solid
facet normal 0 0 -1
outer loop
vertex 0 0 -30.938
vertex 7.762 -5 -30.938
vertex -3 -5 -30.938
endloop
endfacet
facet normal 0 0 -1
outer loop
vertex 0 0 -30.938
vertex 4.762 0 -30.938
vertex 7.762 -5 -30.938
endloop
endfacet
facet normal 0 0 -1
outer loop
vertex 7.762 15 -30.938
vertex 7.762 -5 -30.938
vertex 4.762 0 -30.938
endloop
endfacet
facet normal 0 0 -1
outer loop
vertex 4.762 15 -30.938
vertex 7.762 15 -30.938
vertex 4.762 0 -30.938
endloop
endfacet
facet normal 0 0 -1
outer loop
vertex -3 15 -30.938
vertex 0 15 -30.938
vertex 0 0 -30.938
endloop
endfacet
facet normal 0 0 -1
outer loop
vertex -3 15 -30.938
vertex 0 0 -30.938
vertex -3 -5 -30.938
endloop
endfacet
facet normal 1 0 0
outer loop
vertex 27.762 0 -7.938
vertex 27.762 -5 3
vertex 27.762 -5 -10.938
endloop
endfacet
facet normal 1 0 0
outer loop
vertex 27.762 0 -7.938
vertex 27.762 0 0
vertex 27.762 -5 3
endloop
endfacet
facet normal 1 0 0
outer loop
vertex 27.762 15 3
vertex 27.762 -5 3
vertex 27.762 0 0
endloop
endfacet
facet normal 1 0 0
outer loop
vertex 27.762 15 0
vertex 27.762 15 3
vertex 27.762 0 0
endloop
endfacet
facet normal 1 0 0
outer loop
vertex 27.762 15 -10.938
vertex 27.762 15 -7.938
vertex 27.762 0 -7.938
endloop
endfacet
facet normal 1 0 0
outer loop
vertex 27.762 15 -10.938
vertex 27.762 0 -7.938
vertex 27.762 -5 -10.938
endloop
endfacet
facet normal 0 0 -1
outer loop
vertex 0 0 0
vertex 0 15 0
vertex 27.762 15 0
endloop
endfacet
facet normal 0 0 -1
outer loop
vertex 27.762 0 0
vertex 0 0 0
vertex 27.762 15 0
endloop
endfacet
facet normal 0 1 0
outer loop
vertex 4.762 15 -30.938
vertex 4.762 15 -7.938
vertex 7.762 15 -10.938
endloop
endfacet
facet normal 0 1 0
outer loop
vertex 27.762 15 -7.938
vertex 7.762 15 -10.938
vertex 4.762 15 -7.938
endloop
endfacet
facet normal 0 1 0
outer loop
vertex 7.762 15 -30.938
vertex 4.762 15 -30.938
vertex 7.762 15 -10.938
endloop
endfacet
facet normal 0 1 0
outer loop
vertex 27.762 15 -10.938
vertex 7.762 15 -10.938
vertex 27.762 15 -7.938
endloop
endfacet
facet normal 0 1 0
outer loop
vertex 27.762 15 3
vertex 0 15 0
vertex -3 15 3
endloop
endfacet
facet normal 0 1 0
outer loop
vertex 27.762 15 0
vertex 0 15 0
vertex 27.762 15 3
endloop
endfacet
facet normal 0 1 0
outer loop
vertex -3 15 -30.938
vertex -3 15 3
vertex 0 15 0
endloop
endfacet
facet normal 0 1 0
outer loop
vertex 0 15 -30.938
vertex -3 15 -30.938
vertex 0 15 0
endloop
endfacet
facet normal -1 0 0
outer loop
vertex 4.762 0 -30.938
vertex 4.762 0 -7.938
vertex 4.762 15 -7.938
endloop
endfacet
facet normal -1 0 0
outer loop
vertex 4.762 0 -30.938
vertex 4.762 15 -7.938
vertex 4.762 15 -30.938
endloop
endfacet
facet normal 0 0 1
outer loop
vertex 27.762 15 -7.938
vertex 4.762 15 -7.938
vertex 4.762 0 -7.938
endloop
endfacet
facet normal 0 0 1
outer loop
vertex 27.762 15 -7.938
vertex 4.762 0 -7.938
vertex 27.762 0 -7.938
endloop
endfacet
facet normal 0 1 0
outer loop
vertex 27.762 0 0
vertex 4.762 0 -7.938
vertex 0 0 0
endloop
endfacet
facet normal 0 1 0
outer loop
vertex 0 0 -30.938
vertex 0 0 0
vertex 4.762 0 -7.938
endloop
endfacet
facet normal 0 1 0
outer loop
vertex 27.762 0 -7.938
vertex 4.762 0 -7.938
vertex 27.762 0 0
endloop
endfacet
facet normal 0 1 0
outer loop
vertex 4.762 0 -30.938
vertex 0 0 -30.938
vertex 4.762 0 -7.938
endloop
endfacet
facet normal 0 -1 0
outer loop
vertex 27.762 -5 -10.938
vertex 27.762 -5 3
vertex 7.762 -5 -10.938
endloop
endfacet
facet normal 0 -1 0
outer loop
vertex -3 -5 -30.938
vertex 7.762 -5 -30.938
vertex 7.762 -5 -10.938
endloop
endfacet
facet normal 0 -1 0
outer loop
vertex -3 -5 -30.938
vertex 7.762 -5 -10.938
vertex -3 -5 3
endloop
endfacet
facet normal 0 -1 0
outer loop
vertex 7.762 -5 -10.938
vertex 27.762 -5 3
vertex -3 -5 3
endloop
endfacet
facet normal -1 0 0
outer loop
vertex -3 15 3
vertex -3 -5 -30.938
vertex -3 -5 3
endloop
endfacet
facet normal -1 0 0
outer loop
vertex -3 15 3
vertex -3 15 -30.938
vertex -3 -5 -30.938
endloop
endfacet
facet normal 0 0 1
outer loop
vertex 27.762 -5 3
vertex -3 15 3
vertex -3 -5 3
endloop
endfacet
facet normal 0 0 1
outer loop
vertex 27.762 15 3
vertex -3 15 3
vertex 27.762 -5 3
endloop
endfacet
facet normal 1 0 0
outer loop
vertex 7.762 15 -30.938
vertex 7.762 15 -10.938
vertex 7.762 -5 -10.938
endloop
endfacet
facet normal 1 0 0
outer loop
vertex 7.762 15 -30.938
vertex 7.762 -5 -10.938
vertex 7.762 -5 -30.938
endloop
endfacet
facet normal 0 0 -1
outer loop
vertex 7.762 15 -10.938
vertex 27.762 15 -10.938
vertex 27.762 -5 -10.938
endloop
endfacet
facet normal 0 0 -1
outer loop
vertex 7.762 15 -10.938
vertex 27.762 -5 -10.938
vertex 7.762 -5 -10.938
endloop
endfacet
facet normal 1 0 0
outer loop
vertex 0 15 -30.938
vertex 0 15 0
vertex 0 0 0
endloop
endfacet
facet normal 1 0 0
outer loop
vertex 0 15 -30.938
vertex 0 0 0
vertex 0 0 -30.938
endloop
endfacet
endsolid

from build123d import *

# Parameters (mm, degrees)
BOSS_EXTRUDE7_DEPTH = 15
BOSS_EXTRUDE8_DEPTH = 5
SKETCH3_W           = 4.7625
SKETCH3_H           = 3
SKETCH3_W_2         = 3
SKETCH3_H_2         = 7.9375
CUT_EXTRUDE1_DEPTH  = 15


with BuildPart() as part:
    # Sketch1 → Boss-Extrude7 (new body)
    with BuildSketch(Plane(origin=(0, 0, 0), x_dir=(1, 0, 0), z_dir=(0, 1, 0))):
        Polygon((24.7625, 10.9375), (7.7625, 10.9375), (7.7625, 27.9375), (7.7625, 30.9375), (-3, 30.9375), (-3, 27.9375), (-3, -3), (24.7625, -3), (27.7625, -3), (27.7625, 10.9375), align=None)
        Polygon((0, 0), (4.7625, 0), (24.7625, 0), (24.7625, 7.9375), (4.7625, 7.9375), (4.7625, 27.9375), (0, 27.9375), align=None, mode=Mode.SUBTRACT)
    extrude(amount=BOSS_EXTRUDE7_DEPTH)

    # Sketch2 → Boss-Extrude8 (add)
    with BuildSketch(Plane.XZ):
        Polygon((27.7625, 3), (27.7625, -10.9375), (7.7625, -10.9375), (7.7625, -30.9375), (-3, -30.9375), (-3, 3), align=None)
    extrude(amount=BOSS_EXTRUDE8_DEPTH)

    # Sketch3 → Cut-Extrude1 (cut)
    with BuildSketch(Plane(origin=(0, 15, 0), x_dir=(1, 0, 0), z_dir=(0, 1, 0))):
        with Locations((2.38125, 29.4375)):
            Rectangle(SKETCH3_W, SKETCH3_H)
        with Locations((26.2625, 3.96875)):
            Rectangle(SKETCH3_W_2, SKETCH3_H_2)
    extrude(amount=-CUT_EXTRUDE1_DEPTH, mode=Mode.SUBTRACT)


solid = part.part
